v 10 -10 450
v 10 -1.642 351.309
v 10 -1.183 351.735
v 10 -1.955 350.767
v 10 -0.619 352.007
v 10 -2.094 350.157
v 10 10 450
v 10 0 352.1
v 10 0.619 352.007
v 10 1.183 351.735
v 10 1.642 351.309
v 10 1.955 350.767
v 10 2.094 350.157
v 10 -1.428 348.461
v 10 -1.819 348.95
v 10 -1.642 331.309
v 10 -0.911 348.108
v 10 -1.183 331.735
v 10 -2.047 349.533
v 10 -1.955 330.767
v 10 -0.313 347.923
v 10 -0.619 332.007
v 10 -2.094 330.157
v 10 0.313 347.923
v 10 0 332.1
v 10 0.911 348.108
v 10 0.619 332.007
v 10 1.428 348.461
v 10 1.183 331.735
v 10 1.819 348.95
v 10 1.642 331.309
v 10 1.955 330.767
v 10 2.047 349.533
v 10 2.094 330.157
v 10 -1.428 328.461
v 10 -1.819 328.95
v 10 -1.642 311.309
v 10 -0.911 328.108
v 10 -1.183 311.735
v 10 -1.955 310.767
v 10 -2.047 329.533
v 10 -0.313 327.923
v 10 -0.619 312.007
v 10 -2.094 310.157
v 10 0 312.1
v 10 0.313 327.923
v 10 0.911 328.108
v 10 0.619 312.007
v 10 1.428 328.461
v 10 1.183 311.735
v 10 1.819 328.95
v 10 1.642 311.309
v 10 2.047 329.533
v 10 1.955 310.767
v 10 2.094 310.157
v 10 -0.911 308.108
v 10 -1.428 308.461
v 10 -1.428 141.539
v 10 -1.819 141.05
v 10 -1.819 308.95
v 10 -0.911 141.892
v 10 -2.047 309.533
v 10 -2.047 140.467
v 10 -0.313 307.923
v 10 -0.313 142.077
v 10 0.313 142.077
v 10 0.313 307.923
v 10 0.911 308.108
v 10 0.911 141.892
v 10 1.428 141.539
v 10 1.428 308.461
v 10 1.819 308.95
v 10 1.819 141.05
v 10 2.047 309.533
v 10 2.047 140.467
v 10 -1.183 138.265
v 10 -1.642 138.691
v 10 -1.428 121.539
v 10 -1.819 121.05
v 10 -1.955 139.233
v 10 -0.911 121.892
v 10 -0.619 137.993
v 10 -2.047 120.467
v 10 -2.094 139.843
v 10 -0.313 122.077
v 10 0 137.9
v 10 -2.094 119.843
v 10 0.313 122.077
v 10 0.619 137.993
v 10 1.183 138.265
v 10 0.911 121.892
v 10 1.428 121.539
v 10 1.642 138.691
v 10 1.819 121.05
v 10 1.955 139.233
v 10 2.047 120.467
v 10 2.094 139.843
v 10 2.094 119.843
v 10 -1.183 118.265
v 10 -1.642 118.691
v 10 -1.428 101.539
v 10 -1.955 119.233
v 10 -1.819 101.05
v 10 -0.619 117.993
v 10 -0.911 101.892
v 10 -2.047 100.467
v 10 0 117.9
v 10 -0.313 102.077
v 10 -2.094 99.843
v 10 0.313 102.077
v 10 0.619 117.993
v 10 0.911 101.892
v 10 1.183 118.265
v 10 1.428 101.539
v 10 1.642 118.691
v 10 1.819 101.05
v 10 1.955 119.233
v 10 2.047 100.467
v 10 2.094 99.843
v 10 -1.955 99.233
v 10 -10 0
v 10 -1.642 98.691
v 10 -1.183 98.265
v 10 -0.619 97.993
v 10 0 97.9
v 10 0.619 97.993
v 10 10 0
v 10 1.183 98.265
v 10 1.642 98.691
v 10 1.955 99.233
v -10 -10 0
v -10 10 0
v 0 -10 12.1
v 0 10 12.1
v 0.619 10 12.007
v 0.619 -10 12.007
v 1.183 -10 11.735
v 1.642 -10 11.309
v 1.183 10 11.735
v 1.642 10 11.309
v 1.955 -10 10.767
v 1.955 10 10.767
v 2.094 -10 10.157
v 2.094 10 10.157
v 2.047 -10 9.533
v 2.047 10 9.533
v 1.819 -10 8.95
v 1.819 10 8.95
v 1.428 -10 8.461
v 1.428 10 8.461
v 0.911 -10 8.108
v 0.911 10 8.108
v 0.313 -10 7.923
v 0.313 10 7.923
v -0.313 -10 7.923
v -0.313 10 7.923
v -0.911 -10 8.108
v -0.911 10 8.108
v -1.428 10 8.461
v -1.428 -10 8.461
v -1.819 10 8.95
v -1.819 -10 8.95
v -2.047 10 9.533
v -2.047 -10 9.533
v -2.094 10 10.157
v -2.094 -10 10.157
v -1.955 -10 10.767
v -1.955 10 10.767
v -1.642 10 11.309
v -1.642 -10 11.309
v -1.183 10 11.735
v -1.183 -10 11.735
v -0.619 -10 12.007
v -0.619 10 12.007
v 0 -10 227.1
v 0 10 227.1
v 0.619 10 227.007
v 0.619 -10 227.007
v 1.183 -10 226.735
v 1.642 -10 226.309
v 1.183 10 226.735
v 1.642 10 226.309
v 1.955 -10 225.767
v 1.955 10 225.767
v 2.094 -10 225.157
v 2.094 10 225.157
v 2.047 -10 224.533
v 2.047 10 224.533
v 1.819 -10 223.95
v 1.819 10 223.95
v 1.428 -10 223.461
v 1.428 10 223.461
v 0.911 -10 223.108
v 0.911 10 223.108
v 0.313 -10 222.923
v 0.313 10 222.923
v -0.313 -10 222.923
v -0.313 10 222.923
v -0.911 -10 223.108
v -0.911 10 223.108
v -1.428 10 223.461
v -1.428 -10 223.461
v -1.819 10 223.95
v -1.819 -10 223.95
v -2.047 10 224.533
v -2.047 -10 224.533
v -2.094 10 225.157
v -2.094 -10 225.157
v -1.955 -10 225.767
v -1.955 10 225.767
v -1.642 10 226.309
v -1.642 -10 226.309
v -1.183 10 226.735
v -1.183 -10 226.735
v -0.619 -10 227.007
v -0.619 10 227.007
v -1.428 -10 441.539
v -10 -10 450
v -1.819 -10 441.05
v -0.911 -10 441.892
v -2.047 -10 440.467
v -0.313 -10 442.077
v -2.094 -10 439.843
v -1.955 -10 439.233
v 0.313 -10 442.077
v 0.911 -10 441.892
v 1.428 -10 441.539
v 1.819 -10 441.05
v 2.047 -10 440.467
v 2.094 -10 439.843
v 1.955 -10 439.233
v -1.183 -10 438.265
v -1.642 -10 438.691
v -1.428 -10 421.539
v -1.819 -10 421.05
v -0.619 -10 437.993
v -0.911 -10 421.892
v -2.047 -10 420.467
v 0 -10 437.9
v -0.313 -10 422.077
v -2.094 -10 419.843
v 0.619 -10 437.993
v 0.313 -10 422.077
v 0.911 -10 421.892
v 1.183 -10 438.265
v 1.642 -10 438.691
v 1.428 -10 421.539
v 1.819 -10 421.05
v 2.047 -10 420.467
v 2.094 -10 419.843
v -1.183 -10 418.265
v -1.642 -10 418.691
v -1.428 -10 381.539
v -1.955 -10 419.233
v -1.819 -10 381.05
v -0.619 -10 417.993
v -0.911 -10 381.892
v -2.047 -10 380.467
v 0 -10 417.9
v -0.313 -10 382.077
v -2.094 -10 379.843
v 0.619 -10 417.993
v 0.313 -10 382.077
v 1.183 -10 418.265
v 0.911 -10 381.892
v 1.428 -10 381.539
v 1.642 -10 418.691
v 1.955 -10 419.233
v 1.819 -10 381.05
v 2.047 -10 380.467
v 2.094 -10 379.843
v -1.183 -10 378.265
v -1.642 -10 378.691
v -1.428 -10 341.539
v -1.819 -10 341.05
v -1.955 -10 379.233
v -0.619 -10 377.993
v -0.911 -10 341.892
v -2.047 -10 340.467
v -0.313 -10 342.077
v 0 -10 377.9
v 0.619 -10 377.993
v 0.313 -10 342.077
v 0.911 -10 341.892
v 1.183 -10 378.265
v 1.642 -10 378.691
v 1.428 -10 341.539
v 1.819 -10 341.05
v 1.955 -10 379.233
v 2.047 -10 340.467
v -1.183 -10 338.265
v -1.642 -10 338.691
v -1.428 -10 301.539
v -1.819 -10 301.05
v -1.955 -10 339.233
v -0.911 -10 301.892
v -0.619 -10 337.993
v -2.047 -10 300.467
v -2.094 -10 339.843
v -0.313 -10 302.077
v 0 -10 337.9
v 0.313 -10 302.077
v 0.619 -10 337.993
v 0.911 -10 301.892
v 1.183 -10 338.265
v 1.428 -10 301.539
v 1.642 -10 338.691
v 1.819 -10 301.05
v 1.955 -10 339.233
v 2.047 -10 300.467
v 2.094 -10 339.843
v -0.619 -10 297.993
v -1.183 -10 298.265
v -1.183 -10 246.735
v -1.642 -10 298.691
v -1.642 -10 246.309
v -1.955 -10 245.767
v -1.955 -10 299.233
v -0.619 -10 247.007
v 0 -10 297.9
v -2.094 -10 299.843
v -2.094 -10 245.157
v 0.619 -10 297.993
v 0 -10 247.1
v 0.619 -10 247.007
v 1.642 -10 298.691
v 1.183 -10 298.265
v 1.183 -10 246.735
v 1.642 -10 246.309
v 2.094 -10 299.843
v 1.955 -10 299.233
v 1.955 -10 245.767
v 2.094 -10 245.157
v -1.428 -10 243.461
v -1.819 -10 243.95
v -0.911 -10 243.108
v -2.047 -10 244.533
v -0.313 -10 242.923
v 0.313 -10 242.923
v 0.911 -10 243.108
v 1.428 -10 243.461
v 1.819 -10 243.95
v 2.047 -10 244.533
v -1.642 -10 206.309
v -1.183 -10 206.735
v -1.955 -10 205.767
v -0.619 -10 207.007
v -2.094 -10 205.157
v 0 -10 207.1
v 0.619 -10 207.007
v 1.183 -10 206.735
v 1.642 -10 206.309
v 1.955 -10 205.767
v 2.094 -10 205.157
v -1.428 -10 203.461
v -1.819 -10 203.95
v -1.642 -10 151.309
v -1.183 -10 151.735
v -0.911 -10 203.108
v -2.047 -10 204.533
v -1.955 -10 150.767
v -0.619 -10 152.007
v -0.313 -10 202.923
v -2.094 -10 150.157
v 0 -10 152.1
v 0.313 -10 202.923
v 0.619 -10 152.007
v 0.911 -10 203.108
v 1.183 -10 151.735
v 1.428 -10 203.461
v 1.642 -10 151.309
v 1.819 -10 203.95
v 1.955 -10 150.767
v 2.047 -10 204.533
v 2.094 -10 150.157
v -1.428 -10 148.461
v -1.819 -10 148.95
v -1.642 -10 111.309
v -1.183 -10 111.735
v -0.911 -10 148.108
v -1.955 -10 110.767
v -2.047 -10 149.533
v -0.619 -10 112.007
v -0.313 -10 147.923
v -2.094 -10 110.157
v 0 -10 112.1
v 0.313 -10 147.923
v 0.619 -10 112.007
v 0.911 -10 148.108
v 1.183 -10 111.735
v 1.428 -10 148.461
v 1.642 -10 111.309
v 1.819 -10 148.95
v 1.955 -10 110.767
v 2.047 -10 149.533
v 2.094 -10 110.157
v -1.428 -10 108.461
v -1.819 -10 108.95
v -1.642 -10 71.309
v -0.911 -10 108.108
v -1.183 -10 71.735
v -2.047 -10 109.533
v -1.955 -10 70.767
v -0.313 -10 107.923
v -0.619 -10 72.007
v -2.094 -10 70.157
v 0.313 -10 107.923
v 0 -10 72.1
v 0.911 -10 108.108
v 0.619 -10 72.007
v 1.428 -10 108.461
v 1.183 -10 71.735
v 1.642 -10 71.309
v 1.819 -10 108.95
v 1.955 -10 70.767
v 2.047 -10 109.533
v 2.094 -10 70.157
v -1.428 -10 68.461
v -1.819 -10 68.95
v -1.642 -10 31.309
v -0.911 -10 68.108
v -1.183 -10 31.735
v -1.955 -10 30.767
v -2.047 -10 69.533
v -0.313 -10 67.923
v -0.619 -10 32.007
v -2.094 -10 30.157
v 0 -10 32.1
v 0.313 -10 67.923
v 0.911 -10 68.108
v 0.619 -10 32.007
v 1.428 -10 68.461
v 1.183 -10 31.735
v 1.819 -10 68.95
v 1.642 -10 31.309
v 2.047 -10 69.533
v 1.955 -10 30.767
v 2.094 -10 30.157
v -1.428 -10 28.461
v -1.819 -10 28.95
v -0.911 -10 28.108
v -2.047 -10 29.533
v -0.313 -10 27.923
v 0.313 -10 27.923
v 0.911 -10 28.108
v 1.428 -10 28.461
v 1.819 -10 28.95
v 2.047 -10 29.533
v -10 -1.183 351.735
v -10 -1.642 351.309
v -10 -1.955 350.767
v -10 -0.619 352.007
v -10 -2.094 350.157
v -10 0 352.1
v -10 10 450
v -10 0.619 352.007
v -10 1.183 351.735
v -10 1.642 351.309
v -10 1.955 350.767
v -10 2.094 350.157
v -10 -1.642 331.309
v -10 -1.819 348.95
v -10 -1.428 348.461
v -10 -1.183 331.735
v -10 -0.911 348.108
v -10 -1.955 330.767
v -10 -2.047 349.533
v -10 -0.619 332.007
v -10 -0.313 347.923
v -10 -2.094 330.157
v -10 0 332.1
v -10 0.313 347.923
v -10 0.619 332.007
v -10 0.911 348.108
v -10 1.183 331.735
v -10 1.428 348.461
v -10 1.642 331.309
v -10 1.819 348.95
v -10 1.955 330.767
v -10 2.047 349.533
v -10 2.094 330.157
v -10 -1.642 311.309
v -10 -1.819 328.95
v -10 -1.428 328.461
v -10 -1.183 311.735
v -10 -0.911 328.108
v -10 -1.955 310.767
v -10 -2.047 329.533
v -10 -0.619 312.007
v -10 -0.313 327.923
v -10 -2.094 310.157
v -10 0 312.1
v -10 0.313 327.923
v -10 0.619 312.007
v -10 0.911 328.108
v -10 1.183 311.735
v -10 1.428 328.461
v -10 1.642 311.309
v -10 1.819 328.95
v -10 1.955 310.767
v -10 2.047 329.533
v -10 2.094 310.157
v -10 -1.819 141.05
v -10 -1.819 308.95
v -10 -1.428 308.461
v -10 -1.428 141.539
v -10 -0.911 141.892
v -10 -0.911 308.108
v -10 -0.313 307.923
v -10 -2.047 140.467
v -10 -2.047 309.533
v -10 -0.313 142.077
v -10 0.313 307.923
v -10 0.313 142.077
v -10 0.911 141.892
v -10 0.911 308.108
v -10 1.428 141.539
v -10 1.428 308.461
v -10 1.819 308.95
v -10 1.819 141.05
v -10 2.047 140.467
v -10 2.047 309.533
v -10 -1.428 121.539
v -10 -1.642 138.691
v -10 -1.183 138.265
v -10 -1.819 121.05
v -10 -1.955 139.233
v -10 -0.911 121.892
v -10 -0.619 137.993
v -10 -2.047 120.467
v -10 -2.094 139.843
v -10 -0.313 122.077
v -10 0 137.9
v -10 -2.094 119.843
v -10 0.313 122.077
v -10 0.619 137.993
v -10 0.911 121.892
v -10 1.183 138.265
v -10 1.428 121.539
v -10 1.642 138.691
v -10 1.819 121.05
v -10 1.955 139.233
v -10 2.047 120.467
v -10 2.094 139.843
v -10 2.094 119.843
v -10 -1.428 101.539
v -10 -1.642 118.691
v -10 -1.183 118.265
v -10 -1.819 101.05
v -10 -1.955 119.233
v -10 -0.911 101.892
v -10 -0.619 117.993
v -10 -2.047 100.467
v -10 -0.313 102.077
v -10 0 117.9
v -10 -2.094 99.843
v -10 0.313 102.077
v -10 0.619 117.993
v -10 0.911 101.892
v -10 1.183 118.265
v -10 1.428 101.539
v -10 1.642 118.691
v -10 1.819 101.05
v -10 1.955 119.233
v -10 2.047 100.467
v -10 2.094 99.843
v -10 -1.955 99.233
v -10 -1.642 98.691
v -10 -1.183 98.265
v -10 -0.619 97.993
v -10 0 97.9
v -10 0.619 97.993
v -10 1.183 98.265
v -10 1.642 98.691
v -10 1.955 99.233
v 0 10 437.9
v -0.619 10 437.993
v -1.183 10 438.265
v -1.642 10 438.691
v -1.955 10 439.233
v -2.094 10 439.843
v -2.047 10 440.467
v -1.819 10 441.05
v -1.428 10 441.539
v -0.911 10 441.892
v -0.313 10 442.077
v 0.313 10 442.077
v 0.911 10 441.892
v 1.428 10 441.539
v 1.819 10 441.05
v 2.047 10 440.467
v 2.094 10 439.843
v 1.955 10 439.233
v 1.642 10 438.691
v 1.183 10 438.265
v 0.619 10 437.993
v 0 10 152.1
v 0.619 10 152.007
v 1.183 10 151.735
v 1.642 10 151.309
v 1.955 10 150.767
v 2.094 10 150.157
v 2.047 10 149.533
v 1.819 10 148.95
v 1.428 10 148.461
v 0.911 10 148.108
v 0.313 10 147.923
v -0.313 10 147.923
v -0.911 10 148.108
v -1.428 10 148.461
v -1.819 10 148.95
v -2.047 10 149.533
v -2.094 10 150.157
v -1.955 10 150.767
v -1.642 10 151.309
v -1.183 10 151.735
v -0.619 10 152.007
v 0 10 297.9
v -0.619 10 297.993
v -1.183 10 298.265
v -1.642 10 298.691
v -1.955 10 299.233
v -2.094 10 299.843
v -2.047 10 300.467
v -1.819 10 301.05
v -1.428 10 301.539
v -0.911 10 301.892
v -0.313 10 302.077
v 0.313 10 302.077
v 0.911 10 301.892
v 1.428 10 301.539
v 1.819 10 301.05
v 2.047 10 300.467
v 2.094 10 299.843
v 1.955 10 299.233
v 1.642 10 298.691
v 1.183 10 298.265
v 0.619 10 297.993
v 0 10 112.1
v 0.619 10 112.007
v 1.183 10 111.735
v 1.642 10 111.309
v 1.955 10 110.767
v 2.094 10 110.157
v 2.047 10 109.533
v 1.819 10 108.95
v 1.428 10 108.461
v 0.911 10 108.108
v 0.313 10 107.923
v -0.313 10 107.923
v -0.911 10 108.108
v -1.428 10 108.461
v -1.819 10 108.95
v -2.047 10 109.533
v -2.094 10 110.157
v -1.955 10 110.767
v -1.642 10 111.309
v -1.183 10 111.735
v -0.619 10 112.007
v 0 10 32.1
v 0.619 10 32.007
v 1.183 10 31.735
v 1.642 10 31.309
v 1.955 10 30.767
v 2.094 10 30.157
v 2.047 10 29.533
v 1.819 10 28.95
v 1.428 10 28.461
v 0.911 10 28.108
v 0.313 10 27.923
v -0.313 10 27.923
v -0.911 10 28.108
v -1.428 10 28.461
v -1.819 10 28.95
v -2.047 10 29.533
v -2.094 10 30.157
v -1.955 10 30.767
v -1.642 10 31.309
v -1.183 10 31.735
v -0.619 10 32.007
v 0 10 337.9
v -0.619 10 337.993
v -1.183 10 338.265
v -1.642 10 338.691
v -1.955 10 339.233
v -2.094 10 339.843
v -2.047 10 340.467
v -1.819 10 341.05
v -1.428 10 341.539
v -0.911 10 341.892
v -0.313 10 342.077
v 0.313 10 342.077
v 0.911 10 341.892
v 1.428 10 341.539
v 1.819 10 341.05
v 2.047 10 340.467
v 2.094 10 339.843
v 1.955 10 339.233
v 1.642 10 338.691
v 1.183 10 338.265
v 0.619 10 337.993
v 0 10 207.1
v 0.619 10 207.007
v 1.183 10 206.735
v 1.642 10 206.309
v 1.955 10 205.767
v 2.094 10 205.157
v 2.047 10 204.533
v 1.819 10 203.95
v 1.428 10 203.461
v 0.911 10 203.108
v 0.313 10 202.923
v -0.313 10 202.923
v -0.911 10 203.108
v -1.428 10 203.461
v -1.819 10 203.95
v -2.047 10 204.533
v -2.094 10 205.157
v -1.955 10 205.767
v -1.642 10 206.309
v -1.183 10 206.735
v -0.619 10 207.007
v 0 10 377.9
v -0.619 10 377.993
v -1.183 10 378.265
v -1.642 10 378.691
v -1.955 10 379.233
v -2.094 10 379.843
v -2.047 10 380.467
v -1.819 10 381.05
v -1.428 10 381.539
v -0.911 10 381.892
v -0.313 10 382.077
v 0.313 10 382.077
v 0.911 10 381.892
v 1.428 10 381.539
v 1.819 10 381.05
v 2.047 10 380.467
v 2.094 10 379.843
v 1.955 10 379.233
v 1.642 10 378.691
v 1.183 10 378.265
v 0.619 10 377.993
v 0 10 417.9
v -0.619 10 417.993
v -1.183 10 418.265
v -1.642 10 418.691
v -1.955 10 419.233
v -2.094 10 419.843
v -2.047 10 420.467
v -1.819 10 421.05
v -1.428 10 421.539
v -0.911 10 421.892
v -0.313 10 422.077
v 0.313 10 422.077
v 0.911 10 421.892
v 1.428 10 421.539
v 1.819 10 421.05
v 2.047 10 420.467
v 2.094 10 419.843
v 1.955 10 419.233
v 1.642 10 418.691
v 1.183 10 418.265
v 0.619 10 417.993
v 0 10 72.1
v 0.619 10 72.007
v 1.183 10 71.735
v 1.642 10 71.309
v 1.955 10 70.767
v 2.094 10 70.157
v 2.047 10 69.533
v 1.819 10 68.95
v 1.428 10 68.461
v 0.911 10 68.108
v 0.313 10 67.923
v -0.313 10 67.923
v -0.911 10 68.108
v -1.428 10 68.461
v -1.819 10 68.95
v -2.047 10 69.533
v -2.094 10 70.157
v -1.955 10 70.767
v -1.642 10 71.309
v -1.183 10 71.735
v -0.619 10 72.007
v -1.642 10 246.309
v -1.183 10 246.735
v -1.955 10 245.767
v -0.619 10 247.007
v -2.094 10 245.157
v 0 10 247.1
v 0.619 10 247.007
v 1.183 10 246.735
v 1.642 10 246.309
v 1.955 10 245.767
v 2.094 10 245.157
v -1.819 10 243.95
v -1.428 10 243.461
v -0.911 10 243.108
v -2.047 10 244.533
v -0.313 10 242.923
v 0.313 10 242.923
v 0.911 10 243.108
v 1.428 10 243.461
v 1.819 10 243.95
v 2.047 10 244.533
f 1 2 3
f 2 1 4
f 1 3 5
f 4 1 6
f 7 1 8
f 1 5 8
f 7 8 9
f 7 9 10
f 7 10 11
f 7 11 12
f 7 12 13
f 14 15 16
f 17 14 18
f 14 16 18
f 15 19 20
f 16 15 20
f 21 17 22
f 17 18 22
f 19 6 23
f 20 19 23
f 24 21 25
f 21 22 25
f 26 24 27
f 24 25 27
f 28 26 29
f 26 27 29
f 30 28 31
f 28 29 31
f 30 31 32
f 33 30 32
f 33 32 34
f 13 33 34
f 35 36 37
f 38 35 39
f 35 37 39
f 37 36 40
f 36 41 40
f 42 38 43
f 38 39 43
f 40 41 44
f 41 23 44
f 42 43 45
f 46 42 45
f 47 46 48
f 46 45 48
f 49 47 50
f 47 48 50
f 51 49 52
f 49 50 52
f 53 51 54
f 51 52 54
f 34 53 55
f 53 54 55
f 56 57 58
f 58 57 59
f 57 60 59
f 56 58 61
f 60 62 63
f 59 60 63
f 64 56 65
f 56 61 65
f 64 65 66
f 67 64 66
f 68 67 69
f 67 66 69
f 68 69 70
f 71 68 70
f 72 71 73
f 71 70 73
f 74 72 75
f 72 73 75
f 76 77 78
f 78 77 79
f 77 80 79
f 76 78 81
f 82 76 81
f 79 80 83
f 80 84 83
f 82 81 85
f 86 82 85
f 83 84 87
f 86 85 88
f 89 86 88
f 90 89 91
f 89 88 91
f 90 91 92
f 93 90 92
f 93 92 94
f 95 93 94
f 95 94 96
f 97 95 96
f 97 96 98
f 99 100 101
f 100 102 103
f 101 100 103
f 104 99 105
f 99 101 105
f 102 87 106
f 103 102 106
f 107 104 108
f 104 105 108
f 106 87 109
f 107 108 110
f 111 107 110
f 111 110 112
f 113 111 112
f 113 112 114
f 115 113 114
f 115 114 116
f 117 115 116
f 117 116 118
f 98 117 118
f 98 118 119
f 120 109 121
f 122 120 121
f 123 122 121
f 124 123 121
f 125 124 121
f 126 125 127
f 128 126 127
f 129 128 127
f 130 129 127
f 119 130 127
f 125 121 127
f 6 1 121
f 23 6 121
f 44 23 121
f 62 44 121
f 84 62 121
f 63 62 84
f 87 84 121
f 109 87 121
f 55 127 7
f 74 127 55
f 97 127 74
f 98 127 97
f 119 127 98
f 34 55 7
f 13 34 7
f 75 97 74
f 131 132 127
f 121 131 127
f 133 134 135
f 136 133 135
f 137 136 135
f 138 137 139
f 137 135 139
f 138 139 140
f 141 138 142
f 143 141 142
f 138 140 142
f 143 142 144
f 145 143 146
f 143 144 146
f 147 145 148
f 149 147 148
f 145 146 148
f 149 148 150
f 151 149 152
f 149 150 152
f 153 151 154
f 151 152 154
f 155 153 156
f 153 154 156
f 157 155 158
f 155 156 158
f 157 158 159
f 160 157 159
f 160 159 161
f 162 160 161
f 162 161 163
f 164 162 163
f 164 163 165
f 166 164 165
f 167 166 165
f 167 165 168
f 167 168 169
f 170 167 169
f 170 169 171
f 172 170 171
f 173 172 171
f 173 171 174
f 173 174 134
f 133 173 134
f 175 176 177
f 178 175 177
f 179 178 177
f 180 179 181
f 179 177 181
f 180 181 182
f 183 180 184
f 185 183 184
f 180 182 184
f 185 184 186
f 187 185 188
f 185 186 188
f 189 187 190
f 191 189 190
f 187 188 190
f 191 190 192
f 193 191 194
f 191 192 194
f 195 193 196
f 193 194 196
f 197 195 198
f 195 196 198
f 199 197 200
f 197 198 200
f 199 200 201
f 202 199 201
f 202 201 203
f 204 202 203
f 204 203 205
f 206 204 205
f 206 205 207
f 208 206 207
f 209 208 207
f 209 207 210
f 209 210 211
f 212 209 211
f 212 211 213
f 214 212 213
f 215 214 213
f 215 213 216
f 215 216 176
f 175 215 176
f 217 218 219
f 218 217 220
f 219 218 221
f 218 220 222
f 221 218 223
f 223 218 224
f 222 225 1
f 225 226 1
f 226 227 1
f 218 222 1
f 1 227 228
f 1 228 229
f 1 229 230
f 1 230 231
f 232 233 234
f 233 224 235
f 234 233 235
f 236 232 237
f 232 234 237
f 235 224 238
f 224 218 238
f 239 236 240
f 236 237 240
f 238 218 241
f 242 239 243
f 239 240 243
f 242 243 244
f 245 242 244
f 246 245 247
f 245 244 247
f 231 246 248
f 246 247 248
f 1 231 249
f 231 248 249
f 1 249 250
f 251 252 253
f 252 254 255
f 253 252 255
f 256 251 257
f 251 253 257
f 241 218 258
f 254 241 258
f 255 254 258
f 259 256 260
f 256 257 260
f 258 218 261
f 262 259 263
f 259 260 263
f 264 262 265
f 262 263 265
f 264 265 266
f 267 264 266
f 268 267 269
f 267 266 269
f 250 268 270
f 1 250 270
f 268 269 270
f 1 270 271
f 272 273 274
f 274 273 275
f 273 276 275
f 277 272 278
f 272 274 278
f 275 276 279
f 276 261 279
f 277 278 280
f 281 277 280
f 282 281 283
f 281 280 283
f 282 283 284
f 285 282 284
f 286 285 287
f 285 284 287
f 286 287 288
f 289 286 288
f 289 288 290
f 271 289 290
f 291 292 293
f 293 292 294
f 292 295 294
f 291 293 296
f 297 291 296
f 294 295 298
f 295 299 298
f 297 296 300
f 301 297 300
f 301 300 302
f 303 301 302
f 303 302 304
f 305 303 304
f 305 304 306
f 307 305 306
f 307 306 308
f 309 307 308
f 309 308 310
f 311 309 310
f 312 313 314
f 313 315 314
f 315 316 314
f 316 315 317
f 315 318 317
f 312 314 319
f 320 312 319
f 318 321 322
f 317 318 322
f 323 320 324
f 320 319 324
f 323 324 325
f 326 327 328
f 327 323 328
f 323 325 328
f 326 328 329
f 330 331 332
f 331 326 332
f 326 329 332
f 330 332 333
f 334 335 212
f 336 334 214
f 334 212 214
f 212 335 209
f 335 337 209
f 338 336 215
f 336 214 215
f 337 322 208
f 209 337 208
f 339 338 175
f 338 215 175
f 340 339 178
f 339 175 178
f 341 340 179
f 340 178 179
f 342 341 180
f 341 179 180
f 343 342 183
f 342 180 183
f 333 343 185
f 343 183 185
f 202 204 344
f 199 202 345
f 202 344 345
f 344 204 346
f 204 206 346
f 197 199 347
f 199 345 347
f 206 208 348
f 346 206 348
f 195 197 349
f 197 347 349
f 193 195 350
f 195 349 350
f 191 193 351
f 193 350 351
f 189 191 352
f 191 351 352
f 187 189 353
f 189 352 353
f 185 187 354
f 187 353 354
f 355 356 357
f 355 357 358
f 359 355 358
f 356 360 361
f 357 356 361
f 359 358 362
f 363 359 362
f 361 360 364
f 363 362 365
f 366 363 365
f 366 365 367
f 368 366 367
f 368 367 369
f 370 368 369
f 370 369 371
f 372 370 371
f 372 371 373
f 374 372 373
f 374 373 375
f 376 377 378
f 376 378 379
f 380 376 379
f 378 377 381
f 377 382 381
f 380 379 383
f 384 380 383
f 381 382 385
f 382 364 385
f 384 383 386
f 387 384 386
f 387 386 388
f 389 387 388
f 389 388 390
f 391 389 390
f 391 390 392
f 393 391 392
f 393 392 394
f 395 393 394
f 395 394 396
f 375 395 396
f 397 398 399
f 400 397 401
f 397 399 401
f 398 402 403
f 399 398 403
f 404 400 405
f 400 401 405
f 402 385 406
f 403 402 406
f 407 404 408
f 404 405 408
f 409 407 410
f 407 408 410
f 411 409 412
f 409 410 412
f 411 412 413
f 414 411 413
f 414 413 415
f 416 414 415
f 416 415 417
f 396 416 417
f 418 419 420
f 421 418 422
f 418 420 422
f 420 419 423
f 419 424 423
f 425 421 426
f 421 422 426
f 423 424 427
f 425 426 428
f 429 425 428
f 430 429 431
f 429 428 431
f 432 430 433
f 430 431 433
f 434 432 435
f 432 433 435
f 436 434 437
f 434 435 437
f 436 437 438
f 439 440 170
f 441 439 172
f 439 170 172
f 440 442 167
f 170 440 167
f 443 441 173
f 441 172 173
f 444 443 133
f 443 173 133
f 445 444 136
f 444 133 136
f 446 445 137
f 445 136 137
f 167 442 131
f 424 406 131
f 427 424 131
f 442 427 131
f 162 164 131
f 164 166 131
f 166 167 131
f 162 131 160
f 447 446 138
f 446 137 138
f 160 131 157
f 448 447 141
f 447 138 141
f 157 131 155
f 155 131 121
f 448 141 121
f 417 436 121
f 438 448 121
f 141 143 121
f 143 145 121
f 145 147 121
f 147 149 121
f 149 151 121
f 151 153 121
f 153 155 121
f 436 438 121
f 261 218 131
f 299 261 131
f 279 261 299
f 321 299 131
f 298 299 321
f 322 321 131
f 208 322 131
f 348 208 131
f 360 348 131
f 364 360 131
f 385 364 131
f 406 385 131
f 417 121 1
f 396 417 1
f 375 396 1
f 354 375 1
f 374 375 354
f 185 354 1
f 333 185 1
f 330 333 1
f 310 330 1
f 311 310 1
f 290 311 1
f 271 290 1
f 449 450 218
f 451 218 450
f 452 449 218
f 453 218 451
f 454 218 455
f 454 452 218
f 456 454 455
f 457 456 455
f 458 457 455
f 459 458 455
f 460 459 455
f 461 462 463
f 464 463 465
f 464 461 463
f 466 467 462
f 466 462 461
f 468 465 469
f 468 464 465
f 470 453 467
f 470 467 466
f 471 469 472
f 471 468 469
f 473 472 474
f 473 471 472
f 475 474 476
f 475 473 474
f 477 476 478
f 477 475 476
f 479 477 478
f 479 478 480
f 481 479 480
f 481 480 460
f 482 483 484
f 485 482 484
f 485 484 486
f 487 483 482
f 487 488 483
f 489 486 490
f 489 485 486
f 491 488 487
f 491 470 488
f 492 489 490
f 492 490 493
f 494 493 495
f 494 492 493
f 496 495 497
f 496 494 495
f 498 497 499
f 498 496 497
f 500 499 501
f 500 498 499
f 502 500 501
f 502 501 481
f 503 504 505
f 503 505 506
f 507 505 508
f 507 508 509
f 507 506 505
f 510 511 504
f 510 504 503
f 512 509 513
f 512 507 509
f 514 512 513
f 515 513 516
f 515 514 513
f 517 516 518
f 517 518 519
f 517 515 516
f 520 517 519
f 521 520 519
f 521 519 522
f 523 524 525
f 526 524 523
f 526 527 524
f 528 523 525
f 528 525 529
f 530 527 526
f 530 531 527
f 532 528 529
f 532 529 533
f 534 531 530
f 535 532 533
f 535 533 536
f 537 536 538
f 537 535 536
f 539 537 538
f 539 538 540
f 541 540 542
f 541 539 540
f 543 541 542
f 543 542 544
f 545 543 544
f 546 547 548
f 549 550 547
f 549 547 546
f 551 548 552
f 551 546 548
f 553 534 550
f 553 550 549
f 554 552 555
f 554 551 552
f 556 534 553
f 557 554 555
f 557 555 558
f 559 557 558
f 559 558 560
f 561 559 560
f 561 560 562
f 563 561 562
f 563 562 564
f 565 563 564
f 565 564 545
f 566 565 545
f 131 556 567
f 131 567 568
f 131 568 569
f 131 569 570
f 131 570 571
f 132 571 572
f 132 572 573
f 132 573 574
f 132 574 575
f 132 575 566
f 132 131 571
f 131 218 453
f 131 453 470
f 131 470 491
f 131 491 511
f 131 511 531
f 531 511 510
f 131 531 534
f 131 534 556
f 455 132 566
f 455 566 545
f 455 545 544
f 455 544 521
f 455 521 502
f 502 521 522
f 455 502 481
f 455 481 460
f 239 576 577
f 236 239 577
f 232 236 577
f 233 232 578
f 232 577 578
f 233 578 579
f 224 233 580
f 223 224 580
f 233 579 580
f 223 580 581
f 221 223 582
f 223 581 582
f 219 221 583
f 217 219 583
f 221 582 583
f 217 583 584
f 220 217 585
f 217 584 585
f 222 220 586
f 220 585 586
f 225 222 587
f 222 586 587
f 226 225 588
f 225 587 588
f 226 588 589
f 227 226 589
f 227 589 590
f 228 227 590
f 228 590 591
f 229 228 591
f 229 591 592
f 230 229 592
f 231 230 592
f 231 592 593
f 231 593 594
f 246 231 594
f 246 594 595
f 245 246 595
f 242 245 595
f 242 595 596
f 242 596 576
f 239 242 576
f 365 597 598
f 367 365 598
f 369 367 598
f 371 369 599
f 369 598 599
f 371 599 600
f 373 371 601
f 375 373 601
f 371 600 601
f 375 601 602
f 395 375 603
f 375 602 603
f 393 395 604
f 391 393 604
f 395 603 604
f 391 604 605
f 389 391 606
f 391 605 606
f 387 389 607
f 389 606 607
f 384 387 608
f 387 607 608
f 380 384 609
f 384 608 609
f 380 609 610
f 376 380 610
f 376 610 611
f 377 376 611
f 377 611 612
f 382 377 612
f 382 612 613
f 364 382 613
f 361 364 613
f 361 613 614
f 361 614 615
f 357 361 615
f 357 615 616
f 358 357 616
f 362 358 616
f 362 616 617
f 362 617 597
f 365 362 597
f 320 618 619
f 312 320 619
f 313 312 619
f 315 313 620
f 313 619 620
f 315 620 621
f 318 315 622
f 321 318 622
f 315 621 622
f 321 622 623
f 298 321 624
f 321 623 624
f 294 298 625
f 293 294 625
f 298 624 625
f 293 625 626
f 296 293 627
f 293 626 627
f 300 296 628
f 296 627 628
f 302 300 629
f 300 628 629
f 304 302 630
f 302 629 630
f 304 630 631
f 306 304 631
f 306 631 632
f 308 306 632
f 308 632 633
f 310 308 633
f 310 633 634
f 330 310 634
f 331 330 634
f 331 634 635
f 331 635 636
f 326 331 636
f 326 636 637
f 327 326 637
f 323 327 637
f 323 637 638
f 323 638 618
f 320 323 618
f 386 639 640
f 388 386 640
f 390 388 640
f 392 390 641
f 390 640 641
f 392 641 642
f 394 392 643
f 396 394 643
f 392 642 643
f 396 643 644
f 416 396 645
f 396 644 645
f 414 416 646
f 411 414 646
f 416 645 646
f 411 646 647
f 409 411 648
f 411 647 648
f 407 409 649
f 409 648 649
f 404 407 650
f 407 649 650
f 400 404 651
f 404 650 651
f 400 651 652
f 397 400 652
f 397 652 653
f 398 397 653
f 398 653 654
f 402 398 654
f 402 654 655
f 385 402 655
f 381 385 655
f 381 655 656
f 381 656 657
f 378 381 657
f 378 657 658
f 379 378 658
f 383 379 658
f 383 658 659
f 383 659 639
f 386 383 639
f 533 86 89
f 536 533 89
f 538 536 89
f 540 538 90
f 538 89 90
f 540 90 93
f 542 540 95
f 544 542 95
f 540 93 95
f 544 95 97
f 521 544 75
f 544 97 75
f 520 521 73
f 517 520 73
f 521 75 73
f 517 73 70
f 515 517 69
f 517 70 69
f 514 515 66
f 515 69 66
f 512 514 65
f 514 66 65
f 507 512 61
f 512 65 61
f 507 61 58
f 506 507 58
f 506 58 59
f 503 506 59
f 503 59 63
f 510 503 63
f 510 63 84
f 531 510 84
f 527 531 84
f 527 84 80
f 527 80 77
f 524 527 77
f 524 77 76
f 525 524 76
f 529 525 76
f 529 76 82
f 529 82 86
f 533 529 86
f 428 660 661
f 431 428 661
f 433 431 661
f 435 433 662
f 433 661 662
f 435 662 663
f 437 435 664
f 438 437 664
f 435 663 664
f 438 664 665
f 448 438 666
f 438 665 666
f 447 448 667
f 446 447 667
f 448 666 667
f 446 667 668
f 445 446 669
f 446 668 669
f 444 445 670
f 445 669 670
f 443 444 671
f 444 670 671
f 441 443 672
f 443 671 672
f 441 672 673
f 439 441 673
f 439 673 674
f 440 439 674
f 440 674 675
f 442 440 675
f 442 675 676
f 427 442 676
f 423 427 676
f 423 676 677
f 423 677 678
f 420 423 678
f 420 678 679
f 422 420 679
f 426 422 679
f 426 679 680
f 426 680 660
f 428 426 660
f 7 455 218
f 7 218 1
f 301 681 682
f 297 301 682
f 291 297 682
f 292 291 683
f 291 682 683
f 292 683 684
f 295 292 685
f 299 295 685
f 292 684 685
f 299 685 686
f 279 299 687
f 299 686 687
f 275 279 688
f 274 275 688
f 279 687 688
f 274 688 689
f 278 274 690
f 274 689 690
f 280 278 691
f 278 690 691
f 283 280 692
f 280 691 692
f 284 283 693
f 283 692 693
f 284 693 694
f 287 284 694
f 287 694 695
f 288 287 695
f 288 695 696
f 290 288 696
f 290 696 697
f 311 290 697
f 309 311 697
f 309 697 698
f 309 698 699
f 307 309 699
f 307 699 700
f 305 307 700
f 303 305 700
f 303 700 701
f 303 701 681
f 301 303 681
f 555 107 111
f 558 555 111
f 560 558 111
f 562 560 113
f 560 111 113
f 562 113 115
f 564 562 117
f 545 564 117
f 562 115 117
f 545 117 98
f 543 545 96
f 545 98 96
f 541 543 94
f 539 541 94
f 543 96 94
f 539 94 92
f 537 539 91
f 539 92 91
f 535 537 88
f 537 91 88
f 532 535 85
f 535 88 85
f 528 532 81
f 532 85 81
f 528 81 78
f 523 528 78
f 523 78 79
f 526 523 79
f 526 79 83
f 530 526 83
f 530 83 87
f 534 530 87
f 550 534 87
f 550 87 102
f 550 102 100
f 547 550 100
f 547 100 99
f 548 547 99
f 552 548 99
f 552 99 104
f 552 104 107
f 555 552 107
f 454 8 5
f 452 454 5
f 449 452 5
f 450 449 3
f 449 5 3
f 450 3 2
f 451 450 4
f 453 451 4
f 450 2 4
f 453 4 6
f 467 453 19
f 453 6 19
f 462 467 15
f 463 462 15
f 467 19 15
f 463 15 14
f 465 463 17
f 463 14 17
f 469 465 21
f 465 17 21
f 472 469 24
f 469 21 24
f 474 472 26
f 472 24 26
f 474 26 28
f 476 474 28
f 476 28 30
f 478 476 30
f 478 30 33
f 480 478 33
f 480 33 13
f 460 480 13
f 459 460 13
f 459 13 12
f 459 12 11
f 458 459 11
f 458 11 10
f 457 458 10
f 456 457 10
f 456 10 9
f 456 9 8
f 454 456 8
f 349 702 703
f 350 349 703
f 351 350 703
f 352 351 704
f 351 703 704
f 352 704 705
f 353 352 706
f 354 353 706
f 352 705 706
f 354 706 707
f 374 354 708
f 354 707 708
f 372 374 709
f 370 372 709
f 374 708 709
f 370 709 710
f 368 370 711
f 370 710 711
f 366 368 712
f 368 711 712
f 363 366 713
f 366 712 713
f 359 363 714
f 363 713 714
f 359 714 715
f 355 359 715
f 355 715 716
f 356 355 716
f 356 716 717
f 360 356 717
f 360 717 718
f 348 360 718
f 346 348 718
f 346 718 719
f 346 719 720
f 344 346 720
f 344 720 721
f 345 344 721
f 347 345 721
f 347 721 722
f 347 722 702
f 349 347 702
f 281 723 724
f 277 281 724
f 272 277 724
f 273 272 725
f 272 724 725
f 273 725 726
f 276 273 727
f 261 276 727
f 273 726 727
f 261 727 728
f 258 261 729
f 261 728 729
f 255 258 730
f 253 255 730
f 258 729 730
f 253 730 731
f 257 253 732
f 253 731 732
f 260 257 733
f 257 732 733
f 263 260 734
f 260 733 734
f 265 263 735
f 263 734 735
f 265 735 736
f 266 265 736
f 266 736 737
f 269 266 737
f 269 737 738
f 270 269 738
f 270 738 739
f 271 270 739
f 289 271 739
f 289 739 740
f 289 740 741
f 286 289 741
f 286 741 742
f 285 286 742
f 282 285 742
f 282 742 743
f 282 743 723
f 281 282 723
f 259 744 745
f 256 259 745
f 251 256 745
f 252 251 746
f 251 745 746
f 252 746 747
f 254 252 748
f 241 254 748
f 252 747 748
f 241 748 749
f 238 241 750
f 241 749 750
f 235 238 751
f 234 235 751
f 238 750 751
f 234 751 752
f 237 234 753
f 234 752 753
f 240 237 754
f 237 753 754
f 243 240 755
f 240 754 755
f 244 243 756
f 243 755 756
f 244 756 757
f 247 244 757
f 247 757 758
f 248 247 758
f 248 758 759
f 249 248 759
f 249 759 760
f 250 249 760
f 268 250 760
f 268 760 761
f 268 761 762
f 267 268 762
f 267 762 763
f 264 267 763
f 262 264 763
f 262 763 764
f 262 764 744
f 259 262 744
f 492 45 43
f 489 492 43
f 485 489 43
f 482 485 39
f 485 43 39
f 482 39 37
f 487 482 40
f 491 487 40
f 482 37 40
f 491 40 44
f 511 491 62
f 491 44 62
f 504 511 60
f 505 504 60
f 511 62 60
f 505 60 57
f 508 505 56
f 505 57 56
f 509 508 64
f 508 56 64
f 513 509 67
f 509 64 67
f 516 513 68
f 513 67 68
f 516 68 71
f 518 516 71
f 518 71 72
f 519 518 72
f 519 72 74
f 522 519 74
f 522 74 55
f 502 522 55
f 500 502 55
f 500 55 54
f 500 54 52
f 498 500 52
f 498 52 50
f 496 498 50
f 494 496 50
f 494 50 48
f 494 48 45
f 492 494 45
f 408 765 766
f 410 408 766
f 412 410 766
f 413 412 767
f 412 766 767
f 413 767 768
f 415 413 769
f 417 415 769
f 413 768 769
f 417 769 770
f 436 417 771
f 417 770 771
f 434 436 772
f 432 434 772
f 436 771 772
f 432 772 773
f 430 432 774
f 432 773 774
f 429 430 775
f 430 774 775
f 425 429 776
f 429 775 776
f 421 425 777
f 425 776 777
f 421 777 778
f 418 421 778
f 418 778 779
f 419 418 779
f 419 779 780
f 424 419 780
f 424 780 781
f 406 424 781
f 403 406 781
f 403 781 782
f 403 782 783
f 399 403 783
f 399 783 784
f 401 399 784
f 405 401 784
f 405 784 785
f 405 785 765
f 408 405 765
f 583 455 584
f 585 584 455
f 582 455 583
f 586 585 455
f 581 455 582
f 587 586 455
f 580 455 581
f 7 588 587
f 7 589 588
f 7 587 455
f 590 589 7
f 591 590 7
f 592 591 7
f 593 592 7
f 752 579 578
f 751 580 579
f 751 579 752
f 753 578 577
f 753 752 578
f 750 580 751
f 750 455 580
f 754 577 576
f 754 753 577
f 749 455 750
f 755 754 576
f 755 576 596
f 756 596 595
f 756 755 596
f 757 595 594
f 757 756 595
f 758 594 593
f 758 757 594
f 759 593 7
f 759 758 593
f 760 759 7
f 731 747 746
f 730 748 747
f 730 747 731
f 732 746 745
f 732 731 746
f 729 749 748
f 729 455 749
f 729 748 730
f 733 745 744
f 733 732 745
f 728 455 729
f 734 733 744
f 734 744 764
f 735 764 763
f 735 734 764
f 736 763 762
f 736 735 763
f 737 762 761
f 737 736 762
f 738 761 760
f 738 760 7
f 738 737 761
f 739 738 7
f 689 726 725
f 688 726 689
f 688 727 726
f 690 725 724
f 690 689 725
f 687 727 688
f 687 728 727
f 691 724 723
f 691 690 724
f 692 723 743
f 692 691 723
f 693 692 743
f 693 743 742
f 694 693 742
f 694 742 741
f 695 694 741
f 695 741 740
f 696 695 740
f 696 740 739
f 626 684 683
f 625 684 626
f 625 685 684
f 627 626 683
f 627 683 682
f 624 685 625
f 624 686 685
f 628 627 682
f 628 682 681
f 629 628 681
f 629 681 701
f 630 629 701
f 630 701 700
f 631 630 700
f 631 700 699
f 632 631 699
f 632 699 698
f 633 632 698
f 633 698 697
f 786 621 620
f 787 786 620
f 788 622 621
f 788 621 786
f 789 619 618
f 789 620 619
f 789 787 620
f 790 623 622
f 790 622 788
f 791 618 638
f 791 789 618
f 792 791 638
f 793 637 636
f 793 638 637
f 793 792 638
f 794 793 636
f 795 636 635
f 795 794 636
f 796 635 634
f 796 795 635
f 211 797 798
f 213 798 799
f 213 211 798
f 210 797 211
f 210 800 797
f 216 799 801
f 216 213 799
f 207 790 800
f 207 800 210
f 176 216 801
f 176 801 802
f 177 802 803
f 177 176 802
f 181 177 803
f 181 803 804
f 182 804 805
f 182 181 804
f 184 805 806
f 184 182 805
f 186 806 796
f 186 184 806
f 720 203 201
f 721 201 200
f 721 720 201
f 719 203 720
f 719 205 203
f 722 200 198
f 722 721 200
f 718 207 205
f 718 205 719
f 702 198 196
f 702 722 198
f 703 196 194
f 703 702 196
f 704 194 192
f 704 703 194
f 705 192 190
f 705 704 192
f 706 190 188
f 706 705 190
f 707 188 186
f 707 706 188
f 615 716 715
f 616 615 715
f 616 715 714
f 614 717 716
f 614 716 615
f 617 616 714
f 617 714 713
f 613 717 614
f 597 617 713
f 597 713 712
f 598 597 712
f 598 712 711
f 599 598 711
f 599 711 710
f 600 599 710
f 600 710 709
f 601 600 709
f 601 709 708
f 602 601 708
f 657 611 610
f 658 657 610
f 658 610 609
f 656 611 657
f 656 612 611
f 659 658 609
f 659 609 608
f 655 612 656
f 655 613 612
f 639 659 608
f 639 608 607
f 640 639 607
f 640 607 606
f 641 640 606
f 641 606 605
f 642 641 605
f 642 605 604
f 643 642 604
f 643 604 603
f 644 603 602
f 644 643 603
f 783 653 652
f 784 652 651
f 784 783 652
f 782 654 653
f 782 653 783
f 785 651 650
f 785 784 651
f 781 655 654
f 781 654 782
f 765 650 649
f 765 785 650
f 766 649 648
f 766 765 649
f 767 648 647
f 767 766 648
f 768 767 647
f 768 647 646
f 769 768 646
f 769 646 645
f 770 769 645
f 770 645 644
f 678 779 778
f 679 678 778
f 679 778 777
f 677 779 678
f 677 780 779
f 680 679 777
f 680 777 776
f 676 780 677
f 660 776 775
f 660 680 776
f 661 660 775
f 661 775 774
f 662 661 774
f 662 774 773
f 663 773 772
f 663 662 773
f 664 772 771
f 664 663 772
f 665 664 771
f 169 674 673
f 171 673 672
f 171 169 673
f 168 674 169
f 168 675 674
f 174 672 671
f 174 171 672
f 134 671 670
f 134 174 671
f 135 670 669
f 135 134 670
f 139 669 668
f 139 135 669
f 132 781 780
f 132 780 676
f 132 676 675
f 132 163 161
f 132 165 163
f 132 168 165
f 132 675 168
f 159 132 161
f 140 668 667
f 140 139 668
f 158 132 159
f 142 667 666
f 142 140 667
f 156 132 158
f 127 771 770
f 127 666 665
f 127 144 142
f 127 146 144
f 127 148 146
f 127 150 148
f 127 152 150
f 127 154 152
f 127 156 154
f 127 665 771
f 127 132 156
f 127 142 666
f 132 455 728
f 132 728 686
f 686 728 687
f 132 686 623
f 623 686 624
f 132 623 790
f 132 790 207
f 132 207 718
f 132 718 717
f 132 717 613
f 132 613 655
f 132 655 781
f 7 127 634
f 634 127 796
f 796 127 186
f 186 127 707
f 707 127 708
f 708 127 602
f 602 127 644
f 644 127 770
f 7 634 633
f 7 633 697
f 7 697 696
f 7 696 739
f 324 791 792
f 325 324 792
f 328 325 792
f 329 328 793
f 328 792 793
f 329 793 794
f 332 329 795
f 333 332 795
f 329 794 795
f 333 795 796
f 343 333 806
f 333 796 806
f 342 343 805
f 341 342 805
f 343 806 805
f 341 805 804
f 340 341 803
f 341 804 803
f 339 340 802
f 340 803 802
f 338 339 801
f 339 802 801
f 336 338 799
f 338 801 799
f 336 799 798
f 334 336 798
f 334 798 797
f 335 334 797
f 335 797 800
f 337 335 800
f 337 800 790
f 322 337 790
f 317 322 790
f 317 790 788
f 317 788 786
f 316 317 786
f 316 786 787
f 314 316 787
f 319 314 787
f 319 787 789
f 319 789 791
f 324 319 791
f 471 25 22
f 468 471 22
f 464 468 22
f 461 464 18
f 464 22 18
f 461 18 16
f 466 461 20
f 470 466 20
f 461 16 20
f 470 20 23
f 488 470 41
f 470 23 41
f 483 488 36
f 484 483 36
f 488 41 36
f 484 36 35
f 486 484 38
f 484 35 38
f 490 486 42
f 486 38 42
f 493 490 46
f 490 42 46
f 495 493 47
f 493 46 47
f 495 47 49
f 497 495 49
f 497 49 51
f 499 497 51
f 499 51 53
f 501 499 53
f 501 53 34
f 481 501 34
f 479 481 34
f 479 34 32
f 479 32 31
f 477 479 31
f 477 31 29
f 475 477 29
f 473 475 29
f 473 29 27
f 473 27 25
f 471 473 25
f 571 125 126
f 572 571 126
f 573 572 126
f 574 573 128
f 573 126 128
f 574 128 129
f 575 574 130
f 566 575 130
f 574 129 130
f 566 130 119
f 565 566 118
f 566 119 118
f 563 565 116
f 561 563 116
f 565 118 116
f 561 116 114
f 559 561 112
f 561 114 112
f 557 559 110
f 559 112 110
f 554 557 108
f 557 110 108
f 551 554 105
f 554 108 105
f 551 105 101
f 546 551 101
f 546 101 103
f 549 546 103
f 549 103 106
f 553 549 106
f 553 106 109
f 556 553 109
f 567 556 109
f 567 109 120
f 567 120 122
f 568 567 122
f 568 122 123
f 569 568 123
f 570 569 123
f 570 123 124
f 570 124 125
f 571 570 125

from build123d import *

# Parameters (mm, degrees)
SKETCH_1_W          = 20
SKETCH_1_H          = 20
EXTRUDE_1_DEPTH     = 450
SKETCH_2_R          = 2.1
CUT_EXTRUDE_1_DEPTH = 451.555213043
SKETCH_3_R          = 2.1
CUT_EXTRUDE_2_DEPTH = 451.555213043
SKETCH_4_R          = 2.1
CUT_EXTRUDE_3_DEPTH = 451.555213043


with BuildPart() as part:
    # 草图1 → 凸台-拉伸1 (new body)
    with BuildSketch(Plane.XY):
        Rectangle(SKETCH_1_W, SKETCH_1_H)
    extrude(amount=EXTRUDE_1_DEPTH)

    # 草图2 → 切除-拉伸1 (cut, through all)
    with BuildSketch(Plane(origin=(10, 0, 0), x_dir=(0, 0, -1), z_dir=(1, 0, 0))):
        with Locations((-100, 0)):
            Circle(SKETCH_2_R)
        with Locations((-120, 0)):
            Circle(SKETCH_2_R)
        with Locations((-140, 0)):
            Circle(SKETCH_2_R)
        with Locations(Location((-350, 0, 0), (0, 0, 180))):
            Circle(SKETCH_2_R)
        with Locations(Location((-330, 0, 0), (0, 0, 180))):
            Circle(SKETCH_2_R)
        with Locations(Location((-310, 0, 0), (0, 0, 180))):
            Circle(SKETCH_2_R)
    extrude(amount=-CUT_EXTRUDE_1_DEPTH, mode=Mode.SUBTRACT)

    # 草图3 → 切除-拉伸2 (cut, through all)
    with BuildSketch(Plane(origin=(0, 10, 0), x_dir=(1, 0, 0), z_dir=(0, 1, 0))):
        with Locations(Location((0, -245, 0), (0, 0, 270))):
            Circle(SKETCH_3_R)
        with Locations(Location((0, -225, 0), (0, 0, 270))):
            Circle(SKETCH_3_R)
        with Locations(Location((0, -205, 0), (0, 0, 270))):
            Circle(SKETCH_3_R)
    extrude(amount=-CUT_EXTRUDE_2_DEPTH, mode=Mode.SUBTRACT)

    # 草图4 → 切除-拉伸3 (cut, through all)
    with BuildSketch(Plane(origin=(0, 10, 0), x_dir=(1, 0, 0), z_dir=(0, 1, 0))):
        with Locations(Location((0, -10, 0), (0, 0, 270))):
            Circle(SKETCH_4_R)
        with Locations(Location((0, -30, 0), (0, 0, 270))):
            Circle(SKETCH_4_R)
        with Locations(Location((0, -440, 0), (0, 0, 90))):
            Circle(SKETCH_4_R)
        with Locations(Location((0, -420, 0), (0, 0, 90))):
            Circle(SKETCH_4_R)
        with Locations(Location((0, -70, 0), (0, 0, 270))):
            Circle(SKETCH_4_R)
        with Locations(Location((0, -110, 0), (0, 0, 270))):
            Circle(SKETCH_4_R)
        with Locations(Location((0, -150, 0), (0, 0, 270))):
            Circle(SKETCH_4_R)
        with Locations(Location((0, -380, 0), (0, 0, 90))):
            Circle(SKETCH_4_R)
        with Locations(Location((0, -340, 0), (0, 0, 90))):
            Circle(SKETCH_4_R)
        with Locations(Location((0, -300, 0), (0, 0, 90))):
            Circle(SKETCH_4_R)
    extrude(amount=-CUT_EXTRUDE_3_DEPTH, mode=Mode.SUBTRACT)


solid = part.part
